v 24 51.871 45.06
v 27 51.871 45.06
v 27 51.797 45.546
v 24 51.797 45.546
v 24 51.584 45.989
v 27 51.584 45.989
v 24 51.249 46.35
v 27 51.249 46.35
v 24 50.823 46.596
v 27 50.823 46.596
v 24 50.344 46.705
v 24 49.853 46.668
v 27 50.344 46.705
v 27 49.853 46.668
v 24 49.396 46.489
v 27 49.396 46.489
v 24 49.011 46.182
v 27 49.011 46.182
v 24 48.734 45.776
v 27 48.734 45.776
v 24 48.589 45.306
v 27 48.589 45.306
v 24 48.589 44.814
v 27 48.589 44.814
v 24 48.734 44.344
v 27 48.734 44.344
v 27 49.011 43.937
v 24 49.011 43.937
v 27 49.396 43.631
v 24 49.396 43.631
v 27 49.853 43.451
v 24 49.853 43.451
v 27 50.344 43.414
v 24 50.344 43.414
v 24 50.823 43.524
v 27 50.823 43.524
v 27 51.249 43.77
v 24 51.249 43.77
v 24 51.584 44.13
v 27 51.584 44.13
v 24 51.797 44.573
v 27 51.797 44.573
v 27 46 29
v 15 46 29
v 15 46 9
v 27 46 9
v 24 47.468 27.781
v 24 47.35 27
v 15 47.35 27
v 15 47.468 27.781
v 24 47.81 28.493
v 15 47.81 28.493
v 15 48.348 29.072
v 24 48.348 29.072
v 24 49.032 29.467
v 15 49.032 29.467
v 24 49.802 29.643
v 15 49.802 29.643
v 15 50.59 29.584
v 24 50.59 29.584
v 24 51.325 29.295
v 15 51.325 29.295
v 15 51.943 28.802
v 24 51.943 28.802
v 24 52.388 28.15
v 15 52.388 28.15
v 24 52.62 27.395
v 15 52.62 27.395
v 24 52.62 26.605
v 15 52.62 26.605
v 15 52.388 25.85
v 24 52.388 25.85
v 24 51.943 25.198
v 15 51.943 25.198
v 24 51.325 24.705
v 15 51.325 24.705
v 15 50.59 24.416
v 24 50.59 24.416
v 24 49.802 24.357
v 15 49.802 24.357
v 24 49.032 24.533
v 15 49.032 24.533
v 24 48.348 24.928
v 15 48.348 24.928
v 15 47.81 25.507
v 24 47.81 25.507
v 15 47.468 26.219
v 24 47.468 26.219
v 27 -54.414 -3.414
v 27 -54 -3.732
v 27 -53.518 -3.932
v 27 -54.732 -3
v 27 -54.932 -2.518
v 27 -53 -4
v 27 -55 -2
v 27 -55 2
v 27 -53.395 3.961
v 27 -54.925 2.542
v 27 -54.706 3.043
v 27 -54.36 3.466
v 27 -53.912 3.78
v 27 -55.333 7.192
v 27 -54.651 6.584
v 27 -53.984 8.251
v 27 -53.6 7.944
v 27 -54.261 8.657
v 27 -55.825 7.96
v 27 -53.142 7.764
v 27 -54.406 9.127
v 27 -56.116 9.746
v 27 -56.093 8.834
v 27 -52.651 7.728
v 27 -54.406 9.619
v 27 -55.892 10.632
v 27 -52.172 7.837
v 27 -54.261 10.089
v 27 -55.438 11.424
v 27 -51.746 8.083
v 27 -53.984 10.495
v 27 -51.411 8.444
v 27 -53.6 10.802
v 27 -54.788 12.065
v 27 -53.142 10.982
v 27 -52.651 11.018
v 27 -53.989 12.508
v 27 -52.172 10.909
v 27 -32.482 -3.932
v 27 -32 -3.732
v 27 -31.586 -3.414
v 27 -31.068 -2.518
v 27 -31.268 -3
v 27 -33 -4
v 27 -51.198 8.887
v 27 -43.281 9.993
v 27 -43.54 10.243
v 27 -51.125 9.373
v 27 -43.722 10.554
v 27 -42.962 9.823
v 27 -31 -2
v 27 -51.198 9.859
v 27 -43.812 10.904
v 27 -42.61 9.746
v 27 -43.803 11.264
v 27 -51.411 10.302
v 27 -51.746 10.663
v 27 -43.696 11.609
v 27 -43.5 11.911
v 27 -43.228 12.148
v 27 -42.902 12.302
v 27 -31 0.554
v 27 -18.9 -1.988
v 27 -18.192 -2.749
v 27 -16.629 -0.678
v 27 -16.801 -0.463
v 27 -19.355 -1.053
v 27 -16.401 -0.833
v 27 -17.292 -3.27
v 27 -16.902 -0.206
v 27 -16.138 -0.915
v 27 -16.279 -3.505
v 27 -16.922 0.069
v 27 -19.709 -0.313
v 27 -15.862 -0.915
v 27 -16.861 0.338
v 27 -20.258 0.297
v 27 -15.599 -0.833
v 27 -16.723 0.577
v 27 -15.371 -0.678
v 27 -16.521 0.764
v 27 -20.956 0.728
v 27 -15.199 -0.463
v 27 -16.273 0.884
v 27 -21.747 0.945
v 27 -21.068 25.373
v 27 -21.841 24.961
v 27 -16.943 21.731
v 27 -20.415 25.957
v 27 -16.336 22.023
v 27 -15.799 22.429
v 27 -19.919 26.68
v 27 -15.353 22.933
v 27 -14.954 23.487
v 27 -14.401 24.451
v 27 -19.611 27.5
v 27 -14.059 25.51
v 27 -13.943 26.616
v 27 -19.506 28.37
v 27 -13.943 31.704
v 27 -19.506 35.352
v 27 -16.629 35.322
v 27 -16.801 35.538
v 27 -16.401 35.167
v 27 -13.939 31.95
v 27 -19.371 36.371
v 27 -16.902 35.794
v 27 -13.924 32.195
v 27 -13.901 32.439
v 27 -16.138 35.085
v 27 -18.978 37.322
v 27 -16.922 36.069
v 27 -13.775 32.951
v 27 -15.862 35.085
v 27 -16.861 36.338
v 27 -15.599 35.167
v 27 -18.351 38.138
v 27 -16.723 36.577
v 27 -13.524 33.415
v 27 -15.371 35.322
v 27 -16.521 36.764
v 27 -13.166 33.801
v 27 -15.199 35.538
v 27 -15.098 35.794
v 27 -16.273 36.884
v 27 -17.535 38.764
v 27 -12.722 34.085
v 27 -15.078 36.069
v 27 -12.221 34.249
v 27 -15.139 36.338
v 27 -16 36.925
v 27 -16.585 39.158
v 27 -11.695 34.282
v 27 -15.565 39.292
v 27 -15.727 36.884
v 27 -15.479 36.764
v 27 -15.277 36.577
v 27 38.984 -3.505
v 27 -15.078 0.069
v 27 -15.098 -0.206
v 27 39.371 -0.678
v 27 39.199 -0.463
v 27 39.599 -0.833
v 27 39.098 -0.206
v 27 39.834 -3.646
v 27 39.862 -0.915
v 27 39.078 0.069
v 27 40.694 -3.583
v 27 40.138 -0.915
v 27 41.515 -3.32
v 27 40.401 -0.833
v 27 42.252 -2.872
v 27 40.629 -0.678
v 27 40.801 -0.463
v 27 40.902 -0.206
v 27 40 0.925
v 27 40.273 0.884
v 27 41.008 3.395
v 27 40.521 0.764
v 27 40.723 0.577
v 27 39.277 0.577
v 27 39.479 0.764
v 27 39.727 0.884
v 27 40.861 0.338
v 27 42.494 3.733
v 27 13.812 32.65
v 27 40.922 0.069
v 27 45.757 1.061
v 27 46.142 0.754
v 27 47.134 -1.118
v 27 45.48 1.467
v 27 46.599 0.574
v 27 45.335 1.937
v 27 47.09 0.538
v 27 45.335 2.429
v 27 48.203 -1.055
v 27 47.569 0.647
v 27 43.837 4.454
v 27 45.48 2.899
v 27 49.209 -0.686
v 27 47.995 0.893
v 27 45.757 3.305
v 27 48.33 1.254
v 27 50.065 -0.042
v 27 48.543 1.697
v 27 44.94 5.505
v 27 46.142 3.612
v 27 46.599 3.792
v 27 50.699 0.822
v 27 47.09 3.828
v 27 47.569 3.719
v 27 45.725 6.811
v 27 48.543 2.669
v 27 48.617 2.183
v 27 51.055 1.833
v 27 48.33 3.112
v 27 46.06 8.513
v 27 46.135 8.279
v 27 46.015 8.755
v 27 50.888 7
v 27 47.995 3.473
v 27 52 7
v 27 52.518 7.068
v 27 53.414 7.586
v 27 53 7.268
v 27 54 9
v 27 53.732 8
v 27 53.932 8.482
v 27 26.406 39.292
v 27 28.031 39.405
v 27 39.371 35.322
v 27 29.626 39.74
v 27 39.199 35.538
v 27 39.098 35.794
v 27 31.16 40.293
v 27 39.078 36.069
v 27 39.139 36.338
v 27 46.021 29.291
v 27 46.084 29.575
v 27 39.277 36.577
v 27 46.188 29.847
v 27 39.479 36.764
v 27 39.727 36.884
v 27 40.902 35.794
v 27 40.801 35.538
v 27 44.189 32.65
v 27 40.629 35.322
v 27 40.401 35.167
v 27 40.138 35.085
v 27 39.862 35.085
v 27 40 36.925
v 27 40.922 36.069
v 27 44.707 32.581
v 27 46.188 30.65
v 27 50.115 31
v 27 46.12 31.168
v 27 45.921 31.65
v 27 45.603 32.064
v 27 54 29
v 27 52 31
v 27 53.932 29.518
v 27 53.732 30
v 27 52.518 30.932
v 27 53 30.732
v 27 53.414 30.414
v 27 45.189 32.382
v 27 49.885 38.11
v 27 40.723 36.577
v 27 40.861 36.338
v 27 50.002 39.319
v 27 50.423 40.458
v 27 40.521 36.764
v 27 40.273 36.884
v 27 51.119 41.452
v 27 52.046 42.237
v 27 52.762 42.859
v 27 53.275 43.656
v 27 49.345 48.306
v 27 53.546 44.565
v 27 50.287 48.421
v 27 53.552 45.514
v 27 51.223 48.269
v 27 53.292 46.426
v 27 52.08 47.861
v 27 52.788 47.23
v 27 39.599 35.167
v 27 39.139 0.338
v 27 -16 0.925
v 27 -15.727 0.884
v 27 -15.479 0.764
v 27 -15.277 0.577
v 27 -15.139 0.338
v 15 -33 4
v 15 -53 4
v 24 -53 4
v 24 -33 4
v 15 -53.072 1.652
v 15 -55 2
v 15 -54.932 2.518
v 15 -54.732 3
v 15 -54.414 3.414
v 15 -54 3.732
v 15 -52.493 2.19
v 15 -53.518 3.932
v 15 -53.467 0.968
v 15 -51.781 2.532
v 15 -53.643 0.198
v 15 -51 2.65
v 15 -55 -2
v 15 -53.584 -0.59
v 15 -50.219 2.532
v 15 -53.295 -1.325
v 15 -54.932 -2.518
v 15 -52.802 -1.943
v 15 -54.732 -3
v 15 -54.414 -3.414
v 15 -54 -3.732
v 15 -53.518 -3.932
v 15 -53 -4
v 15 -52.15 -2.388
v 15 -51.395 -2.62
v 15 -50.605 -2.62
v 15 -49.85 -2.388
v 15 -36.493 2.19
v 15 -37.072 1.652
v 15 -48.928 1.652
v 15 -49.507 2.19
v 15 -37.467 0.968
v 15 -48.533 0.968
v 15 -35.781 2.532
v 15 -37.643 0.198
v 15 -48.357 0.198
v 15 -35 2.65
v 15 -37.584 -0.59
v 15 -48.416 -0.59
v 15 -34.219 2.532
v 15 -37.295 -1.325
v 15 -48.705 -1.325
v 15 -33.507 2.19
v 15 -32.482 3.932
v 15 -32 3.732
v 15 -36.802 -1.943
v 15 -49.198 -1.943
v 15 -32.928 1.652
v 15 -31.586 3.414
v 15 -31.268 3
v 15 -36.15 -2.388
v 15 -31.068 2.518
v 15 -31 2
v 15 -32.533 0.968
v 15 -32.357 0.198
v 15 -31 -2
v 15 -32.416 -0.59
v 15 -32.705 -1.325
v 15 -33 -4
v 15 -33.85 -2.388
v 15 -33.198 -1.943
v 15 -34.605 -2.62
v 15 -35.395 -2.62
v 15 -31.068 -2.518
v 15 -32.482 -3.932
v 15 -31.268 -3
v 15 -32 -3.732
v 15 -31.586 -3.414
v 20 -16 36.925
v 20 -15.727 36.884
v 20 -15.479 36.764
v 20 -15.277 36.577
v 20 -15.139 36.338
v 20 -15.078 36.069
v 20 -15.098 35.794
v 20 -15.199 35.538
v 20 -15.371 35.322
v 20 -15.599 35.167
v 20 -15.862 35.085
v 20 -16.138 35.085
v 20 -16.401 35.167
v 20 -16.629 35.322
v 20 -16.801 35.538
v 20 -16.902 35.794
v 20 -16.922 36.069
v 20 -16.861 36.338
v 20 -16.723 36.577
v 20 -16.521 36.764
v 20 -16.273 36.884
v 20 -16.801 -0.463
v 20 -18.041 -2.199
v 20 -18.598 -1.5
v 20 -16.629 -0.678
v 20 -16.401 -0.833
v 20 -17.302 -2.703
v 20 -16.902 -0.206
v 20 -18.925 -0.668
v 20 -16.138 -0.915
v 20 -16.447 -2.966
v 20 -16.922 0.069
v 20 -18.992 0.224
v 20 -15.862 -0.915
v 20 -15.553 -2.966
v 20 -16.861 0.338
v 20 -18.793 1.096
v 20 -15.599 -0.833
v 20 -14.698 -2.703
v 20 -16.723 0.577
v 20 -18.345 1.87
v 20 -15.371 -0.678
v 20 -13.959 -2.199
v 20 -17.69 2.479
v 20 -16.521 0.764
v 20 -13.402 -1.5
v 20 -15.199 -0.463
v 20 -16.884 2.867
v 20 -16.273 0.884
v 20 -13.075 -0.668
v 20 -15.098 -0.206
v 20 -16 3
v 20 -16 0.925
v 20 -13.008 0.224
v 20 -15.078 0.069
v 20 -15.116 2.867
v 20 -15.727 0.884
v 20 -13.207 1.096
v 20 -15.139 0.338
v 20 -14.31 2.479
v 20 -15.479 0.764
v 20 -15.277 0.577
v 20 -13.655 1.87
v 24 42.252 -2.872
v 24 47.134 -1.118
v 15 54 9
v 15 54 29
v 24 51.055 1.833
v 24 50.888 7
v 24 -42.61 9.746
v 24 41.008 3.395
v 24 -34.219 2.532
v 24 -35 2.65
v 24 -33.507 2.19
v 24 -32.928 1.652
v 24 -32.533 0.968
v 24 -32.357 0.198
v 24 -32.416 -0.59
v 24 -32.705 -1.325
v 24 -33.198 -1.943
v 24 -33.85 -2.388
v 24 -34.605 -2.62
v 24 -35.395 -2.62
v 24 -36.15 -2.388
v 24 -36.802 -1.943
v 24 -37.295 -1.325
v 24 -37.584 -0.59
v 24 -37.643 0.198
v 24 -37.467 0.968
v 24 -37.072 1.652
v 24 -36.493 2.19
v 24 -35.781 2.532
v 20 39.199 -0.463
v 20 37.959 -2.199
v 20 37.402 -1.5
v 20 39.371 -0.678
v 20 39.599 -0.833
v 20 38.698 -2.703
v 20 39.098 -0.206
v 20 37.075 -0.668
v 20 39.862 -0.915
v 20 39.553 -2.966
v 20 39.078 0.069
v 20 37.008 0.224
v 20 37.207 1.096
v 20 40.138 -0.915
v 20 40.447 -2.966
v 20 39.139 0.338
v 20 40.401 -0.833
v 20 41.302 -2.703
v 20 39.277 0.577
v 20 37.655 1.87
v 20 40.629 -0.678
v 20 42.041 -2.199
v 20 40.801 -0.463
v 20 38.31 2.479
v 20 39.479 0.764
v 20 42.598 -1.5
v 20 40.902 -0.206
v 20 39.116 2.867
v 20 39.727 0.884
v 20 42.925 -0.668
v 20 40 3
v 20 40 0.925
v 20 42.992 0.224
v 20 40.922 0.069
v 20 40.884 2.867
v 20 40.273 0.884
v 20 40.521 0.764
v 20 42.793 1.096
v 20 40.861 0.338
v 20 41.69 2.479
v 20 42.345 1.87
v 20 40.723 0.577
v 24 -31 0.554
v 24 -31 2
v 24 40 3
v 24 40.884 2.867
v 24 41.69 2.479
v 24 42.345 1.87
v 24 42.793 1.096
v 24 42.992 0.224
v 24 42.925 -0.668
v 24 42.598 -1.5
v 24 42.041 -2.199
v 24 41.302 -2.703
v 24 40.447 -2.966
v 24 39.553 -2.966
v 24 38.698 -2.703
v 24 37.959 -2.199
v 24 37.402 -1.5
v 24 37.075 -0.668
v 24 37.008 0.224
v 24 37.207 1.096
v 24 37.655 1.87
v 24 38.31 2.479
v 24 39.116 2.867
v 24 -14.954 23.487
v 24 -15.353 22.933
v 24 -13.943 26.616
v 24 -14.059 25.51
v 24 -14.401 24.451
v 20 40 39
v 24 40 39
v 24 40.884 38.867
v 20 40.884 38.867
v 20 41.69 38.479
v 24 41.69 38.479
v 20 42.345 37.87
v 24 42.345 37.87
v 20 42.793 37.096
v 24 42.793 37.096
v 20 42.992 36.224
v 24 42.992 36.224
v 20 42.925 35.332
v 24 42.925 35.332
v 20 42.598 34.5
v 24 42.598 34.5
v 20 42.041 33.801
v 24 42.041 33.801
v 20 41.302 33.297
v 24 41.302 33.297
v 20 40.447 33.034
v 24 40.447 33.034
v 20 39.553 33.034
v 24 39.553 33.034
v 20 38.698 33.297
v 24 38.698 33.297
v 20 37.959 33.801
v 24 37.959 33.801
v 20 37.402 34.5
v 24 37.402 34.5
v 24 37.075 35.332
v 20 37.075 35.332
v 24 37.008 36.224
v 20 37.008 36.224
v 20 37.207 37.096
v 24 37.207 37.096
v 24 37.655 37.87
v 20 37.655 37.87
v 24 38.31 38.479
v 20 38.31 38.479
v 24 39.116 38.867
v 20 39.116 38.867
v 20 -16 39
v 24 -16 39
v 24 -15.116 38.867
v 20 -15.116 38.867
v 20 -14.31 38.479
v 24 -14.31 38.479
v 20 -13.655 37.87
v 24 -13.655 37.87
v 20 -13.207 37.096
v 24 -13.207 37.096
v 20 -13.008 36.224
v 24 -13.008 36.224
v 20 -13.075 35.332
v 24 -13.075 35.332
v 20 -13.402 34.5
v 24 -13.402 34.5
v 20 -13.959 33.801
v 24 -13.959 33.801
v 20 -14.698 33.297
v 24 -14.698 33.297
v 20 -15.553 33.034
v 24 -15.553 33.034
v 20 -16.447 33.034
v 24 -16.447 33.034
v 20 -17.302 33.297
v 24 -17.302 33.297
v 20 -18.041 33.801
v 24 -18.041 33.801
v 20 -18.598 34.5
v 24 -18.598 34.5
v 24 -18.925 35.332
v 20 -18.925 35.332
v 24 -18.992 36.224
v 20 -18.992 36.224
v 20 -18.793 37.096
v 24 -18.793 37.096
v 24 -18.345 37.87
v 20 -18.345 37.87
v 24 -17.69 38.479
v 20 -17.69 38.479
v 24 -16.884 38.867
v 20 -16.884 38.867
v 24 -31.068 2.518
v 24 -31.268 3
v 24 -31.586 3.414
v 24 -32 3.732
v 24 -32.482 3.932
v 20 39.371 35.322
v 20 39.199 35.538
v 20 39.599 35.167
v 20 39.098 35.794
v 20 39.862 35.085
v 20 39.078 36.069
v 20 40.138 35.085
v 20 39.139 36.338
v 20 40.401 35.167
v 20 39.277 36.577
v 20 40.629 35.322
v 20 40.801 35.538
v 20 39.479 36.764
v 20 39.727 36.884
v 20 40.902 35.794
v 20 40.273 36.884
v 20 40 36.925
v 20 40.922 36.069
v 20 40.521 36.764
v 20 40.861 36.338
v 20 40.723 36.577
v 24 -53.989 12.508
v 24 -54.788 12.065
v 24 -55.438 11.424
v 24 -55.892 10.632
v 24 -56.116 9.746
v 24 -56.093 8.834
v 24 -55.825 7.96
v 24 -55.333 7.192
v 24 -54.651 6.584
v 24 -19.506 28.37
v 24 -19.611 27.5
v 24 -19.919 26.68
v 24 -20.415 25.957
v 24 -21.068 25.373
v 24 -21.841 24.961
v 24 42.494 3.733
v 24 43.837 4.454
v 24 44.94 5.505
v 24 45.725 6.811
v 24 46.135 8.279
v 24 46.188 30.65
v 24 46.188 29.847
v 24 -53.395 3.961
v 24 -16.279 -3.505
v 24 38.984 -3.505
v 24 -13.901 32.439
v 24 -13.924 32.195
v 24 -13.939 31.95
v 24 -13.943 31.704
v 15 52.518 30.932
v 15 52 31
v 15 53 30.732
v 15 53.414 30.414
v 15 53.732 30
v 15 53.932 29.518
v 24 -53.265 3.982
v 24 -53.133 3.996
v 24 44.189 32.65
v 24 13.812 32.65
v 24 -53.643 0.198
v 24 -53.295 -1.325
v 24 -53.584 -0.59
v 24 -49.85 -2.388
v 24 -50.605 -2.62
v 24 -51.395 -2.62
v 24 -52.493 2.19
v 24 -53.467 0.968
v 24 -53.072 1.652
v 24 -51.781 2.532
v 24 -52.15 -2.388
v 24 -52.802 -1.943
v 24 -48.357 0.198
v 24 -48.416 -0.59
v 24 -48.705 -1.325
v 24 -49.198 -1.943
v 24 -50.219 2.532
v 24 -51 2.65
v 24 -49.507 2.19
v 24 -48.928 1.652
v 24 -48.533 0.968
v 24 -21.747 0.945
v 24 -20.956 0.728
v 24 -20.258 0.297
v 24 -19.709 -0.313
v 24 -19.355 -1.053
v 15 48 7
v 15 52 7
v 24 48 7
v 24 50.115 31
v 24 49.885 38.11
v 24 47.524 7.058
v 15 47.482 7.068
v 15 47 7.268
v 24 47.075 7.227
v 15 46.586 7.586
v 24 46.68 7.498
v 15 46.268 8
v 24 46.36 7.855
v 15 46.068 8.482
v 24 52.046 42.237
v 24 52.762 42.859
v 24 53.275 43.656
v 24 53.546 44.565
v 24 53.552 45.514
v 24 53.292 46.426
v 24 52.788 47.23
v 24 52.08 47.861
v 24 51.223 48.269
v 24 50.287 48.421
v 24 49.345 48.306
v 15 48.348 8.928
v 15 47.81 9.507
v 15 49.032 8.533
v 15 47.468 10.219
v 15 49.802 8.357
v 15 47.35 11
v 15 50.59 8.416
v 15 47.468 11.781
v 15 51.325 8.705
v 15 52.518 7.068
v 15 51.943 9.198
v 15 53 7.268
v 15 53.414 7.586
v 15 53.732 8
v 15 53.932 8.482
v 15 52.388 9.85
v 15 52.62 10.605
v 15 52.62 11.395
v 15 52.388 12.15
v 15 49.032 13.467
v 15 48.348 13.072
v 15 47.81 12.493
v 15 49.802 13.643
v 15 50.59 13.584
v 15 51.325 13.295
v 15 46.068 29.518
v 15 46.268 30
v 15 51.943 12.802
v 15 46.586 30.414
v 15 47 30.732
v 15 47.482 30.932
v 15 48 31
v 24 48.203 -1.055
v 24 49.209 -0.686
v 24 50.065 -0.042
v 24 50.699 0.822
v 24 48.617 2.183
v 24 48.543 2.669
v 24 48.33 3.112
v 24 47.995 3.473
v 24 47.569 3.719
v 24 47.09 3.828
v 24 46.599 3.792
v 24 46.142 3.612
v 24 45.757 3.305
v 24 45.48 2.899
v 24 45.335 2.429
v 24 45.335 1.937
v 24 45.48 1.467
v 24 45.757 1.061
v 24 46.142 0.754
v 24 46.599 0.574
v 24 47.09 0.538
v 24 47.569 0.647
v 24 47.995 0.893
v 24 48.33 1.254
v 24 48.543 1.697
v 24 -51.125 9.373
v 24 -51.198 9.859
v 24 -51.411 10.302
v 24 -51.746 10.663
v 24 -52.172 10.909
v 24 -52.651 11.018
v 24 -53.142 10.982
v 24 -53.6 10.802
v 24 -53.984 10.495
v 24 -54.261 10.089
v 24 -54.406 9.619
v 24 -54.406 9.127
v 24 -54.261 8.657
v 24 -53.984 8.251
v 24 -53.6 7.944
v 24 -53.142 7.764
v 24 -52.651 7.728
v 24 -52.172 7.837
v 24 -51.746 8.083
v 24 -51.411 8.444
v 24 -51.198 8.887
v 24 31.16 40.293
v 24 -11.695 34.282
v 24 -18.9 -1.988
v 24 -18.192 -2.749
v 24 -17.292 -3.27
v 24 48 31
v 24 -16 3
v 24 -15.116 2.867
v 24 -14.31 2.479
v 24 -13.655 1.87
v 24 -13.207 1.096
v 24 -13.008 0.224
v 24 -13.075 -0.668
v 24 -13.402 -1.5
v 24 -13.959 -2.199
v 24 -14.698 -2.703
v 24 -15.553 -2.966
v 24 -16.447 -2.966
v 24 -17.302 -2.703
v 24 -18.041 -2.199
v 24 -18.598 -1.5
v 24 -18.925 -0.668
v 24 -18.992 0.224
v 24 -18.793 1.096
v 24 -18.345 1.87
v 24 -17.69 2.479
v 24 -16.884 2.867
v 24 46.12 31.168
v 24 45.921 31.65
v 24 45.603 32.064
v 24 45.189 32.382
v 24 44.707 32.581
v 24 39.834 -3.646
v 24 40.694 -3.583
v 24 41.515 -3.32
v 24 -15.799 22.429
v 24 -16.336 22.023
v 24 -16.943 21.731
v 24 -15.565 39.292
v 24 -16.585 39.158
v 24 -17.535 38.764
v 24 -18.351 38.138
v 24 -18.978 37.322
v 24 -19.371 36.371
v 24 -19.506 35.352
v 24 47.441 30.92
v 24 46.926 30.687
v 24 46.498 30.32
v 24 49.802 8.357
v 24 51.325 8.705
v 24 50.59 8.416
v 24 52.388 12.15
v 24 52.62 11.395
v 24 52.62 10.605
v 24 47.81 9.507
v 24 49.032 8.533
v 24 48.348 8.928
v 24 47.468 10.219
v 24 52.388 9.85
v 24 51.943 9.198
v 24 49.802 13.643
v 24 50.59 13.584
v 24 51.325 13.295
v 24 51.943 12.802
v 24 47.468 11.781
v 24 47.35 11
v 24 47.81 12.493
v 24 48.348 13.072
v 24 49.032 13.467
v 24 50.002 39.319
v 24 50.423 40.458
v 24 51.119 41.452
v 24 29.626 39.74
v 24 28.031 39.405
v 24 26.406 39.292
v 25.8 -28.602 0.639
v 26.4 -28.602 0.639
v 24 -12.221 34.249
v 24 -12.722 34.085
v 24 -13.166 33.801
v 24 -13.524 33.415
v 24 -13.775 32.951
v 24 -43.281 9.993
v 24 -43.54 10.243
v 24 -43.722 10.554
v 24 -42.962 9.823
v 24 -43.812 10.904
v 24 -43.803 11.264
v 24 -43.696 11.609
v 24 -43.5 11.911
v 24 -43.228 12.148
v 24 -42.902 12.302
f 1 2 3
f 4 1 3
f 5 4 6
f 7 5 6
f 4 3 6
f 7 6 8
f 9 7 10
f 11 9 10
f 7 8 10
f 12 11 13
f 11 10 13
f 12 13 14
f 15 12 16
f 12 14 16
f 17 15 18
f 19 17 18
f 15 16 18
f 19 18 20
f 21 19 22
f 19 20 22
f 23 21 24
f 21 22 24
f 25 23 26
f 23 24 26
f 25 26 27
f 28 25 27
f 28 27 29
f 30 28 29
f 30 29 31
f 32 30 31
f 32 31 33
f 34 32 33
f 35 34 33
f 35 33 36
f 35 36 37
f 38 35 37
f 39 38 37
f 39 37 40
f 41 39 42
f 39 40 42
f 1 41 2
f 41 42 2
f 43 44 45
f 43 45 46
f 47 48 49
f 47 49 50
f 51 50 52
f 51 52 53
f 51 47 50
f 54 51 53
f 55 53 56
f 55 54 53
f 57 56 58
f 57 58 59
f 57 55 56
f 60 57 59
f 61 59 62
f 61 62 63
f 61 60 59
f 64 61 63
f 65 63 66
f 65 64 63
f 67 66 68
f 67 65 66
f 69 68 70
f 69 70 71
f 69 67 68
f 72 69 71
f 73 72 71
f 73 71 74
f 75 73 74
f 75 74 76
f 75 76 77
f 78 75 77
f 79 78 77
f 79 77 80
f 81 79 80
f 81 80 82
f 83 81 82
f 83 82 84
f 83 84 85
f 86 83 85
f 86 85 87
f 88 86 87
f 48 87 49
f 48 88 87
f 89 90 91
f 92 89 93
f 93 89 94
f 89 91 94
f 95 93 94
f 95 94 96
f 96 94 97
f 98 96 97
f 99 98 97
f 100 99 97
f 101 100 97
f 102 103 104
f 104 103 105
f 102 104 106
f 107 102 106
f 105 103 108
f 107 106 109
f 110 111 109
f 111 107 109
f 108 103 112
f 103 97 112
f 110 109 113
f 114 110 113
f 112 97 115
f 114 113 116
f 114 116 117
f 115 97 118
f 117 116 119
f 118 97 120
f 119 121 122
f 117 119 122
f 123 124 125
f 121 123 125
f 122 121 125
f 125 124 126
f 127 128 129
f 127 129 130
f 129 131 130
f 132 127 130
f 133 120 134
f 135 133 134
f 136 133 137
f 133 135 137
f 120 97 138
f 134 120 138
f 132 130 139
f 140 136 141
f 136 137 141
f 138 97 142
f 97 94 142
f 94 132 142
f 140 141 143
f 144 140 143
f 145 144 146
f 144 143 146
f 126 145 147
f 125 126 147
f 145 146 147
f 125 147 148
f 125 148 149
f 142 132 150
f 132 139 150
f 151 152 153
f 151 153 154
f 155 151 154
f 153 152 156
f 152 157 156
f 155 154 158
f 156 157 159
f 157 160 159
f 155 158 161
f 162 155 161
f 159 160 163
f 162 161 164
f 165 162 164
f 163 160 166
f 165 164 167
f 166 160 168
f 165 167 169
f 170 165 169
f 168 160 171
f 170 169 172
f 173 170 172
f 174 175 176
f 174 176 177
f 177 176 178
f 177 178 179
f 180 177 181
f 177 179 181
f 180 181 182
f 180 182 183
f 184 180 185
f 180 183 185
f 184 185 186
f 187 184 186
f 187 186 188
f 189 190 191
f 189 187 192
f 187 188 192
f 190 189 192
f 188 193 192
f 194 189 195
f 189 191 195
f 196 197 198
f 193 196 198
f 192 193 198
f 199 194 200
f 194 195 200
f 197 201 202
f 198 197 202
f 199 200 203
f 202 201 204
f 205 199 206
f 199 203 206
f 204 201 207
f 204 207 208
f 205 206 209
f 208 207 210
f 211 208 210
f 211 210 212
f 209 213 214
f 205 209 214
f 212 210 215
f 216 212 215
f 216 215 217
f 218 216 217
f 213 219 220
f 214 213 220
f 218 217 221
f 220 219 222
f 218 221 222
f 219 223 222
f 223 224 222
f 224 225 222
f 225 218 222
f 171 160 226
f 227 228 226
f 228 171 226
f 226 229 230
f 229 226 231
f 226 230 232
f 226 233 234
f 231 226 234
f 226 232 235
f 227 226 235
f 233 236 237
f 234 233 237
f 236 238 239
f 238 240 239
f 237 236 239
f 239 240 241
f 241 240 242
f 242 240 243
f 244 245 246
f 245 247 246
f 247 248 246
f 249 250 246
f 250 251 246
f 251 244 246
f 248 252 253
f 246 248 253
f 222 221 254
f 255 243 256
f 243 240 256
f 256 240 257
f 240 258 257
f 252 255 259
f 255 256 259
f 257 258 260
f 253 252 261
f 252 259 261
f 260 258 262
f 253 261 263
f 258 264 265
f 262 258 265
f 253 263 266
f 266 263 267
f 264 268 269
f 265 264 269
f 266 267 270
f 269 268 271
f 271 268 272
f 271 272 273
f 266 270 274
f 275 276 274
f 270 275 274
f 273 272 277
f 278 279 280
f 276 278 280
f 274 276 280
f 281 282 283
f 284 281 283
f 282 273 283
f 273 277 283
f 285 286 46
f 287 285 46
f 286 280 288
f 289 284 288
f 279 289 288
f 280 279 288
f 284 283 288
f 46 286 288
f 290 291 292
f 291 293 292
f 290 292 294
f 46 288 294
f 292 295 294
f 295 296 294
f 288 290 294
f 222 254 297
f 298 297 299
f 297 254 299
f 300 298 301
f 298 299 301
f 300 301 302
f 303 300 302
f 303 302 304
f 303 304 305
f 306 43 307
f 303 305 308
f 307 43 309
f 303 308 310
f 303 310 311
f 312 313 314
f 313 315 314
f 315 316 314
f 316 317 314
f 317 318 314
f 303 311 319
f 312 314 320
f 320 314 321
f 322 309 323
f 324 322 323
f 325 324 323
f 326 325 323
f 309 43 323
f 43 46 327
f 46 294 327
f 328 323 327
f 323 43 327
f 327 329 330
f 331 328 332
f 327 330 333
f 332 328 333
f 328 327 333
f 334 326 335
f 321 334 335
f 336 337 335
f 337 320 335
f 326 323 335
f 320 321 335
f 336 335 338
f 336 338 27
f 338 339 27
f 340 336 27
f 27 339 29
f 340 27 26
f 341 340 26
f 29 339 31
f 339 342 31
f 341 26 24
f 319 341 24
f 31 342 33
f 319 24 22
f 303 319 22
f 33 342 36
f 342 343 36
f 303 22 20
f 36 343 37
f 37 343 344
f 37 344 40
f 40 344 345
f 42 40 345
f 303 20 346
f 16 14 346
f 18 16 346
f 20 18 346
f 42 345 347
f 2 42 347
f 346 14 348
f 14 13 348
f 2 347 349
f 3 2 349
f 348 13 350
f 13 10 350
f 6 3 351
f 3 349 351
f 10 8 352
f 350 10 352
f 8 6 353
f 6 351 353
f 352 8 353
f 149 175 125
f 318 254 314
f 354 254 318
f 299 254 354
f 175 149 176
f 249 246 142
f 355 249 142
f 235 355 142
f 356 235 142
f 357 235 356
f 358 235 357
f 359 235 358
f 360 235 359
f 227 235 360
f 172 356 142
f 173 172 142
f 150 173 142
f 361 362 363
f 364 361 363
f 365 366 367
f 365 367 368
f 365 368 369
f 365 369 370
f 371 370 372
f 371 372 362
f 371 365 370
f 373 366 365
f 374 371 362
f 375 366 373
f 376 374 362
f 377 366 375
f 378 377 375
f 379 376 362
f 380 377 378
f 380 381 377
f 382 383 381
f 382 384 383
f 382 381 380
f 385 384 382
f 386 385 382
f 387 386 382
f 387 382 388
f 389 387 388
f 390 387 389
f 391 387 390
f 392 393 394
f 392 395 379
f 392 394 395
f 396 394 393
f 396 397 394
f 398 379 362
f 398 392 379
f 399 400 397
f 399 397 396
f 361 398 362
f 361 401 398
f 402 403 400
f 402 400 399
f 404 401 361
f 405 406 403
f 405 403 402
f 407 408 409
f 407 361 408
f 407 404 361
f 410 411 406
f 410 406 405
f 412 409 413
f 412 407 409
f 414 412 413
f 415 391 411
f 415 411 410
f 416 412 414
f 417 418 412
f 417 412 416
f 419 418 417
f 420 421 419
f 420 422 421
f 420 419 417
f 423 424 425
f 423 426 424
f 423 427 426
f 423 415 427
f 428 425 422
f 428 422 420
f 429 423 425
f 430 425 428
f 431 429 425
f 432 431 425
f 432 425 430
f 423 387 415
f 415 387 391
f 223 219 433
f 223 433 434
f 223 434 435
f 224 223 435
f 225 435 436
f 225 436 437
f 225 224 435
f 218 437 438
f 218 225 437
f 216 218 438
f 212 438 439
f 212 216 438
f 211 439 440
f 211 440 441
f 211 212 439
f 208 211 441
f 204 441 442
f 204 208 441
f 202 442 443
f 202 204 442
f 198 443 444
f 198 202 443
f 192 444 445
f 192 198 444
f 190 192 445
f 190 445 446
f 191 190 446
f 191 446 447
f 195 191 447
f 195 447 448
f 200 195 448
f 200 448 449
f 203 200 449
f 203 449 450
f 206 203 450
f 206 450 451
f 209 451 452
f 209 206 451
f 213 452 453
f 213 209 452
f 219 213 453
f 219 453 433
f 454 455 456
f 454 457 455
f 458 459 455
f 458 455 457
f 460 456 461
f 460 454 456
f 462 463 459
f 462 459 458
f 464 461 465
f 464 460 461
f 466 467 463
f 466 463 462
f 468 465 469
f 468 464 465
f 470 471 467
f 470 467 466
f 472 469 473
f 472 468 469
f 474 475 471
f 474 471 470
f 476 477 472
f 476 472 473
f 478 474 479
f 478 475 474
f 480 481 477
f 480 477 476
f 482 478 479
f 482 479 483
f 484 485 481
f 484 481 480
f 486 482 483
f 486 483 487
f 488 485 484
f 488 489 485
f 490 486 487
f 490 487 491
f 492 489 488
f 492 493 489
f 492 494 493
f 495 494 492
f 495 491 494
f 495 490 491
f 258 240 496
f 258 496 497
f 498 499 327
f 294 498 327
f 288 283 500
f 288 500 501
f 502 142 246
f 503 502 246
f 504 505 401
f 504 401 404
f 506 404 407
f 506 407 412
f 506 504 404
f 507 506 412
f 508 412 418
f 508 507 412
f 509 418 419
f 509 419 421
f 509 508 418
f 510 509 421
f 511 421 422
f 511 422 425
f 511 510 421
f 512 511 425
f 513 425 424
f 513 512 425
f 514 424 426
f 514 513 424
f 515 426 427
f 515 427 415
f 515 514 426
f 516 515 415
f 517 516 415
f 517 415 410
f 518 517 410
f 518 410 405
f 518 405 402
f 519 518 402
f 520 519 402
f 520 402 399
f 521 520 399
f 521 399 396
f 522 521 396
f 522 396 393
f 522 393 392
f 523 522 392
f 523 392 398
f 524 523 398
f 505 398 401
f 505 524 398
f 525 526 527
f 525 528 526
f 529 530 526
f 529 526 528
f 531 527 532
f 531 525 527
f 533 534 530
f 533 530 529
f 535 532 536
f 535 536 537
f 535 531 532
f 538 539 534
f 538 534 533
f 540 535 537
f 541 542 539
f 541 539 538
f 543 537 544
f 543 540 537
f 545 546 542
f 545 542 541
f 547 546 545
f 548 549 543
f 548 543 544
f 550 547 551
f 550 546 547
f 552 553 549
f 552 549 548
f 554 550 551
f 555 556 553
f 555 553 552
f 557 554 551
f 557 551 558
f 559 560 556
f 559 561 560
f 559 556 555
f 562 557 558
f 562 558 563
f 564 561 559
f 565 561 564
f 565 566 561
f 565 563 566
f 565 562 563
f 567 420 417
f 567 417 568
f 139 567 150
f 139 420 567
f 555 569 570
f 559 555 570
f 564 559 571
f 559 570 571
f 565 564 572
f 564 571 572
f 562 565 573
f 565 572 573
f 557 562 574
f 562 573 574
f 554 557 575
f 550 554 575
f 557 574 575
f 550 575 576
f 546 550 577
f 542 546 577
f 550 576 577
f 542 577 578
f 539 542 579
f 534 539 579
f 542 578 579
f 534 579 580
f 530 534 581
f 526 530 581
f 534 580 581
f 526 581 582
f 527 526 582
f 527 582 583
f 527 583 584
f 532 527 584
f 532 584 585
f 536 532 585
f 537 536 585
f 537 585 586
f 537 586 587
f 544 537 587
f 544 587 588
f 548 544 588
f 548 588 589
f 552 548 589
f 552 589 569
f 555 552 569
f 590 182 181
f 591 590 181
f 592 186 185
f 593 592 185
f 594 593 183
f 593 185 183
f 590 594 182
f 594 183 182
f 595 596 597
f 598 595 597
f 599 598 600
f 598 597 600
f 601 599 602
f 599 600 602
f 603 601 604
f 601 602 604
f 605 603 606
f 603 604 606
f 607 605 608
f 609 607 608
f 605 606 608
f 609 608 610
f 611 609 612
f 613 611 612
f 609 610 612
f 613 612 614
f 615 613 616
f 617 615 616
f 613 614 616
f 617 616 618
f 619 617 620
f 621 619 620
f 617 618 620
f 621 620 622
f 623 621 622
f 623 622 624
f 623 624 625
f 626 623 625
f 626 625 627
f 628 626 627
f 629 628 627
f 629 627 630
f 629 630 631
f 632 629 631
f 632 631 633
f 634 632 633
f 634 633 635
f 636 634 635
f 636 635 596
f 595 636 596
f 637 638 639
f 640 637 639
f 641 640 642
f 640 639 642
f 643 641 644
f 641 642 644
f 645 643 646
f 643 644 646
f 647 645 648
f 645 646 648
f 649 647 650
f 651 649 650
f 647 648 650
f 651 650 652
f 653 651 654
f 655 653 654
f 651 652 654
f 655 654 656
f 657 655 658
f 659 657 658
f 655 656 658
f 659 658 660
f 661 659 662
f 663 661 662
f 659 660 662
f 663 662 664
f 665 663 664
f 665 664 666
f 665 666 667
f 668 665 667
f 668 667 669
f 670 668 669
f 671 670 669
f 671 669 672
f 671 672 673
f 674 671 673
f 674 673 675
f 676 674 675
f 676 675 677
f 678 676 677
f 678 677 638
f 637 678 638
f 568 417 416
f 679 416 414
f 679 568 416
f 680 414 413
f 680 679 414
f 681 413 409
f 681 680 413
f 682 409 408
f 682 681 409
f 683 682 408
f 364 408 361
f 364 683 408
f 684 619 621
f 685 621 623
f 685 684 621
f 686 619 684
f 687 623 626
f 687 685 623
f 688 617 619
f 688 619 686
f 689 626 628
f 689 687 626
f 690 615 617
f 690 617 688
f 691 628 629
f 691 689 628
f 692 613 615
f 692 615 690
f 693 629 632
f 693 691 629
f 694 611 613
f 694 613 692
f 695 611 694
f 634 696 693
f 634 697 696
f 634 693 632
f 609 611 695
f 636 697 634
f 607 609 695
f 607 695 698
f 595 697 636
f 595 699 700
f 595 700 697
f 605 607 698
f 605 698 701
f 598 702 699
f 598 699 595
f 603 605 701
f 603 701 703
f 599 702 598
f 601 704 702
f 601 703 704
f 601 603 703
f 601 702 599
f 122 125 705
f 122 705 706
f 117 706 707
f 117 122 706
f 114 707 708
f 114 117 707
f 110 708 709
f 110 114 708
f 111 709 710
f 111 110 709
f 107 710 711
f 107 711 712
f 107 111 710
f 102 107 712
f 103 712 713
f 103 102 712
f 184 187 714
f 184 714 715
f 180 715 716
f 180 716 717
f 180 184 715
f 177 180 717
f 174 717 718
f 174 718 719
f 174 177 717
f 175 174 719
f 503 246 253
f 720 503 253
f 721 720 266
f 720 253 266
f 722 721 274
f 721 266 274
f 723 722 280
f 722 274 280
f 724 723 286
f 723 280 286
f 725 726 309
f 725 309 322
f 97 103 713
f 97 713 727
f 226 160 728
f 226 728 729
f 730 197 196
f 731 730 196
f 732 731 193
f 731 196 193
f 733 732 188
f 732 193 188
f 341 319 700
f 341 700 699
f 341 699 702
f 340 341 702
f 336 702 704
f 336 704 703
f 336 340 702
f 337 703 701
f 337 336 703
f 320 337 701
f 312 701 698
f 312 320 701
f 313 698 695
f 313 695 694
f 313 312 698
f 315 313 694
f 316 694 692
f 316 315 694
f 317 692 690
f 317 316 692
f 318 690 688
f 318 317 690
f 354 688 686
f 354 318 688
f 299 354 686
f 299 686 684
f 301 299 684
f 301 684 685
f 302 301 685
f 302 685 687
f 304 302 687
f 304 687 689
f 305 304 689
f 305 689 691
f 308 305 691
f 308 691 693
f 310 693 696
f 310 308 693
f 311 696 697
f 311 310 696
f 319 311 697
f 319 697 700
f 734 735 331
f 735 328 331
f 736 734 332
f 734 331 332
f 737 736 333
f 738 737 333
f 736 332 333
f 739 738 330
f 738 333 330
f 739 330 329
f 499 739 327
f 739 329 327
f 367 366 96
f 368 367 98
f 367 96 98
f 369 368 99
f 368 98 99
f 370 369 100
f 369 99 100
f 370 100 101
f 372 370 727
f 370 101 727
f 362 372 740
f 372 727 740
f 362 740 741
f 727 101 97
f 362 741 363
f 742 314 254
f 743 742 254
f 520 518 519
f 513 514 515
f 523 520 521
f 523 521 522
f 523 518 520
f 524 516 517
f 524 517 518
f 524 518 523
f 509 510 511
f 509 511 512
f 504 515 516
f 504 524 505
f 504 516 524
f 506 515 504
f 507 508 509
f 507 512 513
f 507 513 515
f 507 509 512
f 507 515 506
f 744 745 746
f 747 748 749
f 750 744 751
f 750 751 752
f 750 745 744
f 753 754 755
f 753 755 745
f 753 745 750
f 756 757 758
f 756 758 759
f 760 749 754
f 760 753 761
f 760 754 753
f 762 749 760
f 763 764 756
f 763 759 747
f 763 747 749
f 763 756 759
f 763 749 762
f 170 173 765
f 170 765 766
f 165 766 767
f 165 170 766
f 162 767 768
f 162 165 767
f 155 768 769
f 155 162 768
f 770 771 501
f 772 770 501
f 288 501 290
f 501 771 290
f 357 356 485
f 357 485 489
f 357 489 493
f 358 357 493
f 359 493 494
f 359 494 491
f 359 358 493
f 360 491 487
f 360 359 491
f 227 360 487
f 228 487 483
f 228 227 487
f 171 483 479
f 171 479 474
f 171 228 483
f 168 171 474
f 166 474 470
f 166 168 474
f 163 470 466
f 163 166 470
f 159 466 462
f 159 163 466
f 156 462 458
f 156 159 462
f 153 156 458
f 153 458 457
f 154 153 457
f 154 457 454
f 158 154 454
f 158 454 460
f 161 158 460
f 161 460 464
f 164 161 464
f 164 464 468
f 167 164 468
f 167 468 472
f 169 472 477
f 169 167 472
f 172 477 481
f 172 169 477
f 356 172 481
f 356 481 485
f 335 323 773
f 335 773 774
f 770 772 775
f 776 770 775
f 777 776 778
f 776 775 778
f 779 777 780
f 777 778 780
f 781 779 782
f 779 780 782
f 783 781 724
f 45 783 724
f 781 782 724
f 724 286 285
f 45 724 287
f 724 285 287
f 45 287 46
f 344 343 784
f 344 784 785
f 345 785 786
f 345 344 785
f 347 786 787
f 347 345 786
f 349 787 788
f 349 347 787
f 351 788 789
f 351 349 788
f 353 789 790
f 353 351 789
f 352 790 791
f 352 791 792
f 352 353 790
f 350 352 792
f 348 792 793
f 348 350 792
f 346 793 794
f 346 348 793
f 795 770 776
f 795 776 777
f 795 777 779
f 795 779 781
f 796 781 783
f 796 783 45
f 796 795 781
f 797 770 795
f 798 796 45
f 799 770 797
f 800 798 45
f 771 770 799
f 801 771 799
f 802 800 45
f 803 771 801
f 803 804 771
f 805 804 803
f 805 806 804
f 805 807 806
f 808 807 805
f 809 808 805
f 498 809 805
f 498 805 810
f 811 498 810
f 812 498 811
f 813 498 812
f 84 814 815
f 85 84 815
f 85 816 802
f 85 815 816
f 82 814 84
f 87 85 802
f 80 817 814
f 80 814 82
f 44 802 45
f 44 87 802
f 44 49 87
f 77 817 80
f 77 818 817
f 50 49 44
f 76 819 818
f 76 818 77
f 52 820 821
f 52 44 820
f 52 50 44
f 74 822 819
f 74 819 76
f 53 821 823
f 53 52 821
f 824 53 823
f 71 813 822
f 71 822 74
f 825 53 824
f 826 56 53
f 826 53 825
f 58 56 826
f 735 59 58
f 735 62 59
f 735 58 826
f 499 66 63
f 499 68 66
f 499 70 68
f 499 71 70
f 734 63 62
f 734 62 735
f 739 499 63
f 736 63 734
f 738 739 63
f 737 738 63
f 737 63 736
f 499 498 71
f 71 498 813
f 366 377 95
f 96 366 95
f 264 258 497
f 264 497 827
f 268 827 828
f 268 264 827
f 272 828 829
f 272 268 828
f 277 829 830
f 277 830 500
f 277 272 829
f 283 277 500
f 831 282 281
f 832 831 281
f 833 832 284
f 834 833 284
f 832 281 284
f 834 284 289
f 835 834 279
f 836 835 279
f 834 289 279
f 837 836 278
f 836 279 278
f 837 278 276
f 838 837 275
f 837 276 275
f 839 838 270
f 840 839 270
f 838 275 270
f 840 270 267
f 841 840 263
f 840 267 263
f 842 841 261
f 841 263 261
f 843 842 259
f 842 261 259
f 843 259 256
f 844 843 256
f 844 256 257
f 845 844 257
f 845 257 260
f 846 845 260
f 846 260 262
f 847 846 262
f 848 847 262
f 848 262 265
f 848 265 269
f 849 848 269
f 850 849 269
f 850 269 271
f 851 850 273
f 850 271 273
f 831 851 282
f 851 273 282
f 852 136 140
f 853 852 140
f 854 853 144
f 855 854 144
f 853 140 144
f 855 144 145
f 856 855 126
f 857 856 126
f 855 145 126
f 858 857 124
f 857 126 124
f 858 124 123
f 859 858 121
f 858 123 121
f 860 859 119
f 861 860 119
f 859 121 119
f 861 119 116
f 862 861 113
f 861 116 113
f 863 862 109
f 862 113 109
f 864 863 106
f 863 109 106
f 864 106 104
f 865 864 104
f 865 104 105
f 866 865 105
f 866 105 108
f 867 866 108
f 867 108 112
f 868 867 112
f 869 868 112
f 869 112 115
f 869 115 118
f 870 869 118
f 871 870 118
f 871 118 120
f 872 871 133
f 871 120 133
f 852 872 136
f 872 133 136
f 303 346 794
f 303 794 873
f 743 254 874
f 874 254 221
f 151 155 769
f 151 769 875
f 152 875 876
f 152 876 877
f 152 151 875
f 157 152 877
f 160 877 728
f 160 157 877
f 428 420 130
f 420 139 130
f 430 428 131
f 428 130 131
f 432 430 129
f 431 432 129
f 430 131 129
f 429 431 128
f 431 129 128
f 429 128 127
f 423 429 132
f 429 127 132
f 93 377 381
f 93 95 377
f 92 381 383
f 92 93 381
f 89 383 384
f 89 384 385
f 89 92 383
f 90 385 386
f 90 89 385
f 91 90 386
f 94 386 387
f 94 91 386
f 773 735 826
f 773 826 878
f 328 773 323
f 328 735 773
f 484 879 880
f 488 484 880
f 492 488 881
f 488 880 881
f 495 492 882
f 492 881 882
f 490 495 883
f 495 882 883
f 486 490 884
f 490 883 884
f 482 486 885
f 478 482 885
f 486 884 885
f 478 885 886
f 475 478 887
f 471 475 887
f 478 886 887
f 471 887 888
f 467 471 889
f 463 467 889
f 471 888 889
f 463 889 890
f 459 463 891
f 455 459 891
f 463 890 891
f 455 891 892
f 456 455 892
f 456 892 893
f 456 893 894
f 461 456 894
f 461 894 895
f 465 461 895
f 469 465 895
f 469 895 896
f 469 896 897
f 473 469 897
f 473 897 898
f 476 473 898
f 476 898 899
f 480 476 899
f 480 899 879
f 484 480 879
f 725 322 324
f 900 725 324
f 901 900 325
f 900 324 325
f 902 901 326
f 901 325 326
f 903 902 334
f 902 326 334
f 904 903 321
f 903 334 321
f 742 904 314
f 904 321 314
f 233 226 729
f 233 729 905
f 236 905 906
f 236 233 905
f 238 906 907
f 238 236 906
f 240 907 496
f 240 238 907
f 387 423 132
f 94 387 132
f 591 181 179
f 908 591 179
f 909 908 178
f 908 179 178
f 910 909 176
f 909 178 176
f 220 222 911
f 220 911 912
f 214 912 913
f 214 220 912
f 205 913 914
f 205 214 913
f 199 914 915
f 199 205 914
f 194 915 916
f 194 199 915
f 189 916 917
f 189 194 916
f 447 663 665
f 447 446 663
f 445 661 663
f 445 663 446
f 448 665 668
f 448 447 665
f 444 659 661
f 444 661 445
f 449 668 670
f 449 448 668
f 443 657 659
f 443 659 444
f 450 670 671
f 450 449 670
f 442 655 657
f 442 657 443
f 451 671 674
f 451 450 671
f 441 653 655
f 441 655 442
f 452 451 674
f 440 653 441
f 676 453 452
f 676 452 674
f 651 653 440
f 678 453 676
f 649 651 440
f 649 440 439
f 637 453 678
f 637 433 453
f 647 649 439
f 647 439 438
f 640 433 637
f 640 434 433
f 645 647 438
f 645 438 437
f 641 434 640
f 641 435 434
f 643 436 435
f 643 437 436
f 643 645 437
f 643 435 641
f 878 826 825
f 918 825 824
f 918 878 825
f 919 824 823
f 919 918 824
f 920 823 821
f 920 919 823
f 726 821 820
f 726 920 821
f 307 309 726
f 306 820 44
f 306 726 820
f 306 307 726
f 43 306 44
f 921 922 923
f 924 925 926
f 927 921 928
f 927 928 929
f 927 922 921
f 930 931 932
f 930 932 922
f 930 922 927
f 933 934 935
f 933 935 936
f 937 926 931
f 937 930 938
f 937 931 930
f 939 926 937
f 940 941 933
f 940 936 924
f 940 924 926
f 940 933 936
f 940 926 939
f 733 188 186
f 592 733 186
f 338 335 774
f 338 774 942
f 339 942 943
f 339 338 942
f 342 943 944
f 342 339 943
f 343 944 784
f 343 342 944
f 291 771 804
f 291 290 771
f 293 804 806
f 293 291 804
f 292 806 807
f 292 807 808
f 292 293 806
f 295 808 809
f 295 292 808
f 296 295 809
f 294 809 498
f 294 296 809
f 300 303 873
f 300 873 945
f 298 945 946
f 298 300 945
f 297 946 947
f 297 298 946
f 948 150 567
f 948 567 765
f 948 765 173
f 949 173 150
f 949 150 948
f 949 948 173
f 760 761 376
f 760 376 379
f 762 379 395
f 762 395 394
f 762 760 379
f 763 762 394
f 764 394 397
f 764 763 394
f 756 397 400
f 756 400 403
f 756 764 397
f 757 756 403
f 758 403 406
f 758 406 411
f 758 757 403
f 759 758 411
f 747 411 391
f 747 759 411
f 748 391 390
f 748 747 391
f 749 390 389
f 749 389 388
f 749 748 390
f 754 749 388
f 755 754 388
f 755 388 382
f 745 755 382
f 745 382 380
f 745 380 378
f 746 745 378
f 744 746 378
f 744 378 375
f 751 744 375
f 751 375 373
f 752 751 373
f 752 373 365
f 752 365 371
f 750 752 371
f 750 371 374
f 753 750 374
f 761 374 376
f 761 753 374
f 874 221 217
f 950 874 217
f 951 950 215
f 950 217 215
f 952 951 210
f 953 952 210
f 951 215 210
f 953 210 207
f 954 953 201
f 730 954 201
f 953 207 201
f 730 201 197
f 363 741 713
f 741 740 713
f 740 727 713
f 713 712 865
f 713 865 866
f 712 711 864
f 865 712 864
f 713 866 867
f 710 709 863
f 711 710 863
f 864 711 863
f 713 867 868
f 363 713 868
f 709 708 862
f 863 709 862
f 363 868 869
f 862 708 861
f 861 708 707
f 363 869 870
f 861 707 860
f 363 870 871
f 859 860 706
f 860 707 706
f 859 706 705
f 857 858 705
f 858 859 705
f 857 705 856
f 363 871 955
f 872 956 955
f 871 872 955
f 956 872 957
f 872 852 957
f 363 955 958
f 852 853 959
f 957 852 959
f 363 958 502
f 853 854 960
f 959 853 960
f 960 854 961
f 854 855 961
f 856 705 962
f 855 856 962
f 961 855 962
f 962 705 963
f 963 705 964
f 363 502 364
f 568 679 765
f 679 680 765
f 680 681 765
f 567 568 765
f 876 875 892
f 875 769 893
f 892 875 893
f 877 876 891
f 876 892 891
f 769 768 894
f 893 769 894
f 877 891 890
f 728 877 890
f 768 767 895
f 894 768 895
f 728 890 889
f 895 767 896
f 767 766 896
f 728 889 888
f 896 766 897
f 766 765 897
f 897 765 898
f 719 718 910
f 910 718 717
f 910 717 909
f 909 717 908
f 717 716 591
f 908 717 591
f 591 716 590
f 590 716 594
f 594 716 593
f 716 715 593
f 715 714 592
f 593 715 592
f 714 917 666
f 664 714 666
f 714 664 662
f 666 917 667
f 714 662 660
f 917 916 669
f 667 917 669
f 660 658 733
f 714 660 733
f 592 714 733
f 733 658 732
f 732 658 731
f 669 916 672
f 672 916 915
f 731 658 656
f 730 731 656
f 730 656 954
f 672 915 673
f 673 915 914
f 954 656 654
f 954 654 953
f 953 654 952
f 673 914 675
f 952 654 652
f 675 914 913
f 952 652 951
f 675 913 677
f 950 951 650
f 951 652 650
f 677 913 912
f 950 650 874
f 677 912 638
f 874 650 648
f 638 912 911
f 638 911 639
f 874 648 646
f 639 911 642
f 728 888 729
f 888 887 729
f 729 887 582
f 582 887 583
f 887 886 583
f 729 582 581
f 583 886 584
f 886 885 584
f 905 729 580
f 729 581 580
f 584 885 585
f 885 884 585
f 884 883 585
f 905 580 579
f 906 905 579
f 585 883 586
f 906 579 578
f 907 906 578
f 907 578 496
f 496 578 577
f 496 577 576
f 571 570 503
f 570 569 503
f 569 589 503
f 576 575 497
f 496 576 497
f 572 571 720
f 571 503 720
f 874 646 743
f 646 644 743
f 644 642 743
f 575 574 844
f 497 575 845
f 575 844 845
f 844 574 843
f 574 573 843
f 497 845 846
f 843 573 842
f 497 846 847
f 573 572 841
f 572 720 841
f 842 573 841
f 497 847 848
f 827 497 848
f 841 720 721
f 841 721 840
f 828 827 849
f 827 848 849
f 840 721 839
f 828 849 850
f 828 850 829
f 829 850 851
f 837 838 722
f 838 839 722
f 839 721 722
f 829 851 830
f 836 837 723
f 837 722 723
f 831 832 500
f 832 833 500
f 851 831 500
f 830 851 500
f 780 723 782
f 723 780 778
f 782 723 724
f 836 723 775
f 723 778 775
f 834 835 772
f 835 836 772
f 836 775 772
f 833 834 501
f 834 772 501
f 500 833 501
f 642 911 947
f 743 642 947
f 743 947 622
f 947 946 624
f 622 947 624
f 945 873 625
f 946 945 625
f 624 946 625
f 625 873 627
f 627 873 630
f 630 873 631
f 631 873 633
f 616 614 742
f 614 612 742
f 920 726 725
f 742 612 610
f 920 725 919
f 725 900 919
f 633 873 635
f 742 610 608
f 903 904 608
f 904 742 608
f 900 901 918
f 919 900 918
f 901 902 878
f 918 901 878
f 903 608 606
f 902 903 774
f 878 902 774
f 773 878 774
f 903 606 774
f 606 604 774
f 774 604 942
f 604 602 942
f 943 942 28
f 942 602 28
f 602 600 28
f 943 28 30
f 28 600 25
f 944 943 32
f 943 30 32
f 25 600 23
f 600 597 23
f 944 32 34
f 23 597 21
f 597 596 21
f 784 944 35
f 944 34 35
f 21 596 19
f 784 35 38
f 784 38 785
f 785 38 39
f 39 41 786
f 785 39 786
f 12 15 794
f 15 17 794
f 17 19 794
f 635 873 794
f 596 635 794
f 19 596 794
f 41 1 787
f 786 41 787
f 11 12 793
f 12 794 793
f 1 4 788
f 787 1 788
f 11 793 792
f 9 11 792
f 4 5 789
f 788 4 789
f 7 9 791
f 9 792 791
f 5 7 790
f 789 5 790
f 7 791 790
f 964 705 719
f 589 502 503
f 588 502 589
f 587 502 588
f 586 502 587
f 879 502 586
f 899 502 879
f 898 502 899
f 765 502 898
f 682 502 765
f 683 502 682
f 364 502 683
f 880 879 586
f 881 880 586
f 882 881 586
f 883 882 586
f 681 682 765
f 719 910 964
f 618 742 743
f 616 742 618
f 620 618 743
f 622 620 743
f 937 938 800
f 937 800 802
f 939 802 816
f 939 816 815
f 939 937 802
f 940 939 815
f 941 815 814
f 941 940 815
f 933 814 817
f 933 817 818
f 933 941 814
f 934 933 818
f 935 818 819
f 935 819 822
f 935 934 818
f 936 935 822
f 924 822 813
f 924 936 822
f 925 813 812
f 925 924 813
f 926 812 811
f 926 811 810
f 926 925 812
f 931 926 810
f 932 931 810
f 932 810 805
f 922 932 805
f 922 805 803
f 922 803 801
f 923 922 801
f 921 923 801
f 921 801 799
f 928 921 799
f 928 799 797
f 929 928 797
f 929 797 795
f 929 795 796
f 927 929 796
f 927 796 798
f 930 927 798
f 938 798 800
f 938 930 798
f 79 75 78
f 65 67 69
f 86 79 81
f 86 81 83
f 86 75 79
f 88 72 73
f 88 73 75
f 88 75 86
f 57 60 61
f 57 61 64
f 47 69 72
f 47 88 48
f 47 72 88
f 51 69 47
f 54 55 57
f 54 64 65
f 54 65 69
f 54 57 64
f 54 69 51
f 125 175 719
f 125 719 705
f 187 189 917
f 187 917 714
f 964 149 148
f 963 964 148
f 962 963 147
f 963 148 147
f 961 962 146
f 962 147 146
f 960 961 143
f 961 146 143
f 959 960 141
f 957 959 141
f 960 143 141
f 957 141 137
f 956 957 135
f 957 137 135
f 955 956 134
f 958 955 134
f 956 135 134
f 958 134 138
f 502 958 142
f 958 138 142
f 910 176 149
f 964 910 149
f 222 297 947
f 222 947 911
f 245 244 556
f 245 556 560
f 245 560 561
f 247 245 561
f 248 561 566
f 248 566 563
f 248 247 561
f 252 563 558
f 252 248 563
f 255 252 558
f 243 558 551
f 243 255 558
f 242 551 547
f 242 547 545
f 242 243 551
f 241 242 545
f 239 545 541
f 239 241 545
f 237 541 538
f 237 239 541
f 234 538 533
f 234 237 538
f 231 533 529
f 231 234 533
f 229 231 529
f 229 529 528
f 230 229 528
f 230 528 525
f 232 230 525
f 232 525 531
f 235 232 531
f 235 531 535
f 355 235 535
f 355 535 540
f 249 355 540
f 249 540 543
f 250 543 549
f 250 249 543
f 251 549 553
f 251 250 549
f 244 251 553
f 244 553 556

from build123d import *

# Parameters (mm, degrees)
CYLINDER003_R            = 2.65
CYLINDER003_DEPTH        = 9
CLONE009_PLACEMENT_ANGLE = 90
BOX002_W                 = 12
BOX002_H                 = 24
BOX002_DEPTH             = 8
FILLET_R                 = 2
CYLINDER002_R            = 0.925
CYLINDER002_DEPTH        = 7
CYLINDER001_R            = 3
CYLINDER001_DEPTH        = 7
SKETCH002_R              = 1.65
EXTRUDE002_DEPTH         = 3
CLONE010_PLACEMENT_ANGLE = 90


with BuildPart() as insert001:
    # Cylinder003 → Cylinder003 (new body)
    with BuildSketch(Plane(origin=(24, -35, 3), x_dir=(0, 0, 1), z_dir=(-1, 0, 0))):
        Circle(CYLINDER003_R)
    extrude(amount=CYLINDER003_DEPTH)


with BuildPart() as insert002:
    # Clone006 base: copy of insert001
    add(insert001.part)


with BuildPart() as insert002_1:
    # Clone006 placement: moved
    add(insert002.part.moved(Location((0, -16, 0))))


with BuildPart() as tieinserts001:
    # Fusion002 base: copy of insert001
    add(insert001.part)

    # Fusion002: union insert002
    add(insert002_1.part)


with BuildPart() as tieinserts001_1:
    # Fusion002 placement: moved
    add(tieinserts001.part.moved(Location((0, 0, -3))))


with BuildPart() as insertsfusion003:
    # Clone009 base: copy of tieInserts001
    add(tieinserts001_1.part)


with BuildPart() as insertsfusion003_1:
    # Clone009 placement: moved
    add(insertsfusion003.part.moved(Location((0, 50, 62))).rotate(Axis((0, 50, 62), (1, 0, 0)), CLONE009_PLACEMENT_ANGLE))

    # Fusion003: union tieInserts001
    add(tieinserts001_1.part)


with BuildPart() as tiefillet001:
    # Box002 → Box002 (new body)
    with BuildSketch(Plane(origin=(15, -55, -1), x_dir=(1, 0, 0), z_dir=(0, 0, 1))):
        with Locations((6, 12)):
            Rectangle(BOX002_W, BOX002_H)
    extrude(amount=BOX002_DEPTH)

    # Fillet
    fillet_edges = [tiefillet001.edges().sort_by_distance(p)[0] for p in [
        (21, -55, -1),
        (21, -55, 7),
        (21, -31, -1),
        (21, -31, 7),
    ]]
    fillet(fillet_edges, radius=FILLET_R)


with BuildPart() as tiefillet001_1:
    # Fillet placement: moved
    add(tiefillet001.part.moved(Location((0, 0, -3))))


with BuildPart() as hole002:
    # Cylinder002 → Cylinder002 (new body)
    with BuildSketch(Plane(origin=(27, -16, 0), x_dir=(0, 0, 1), z_dir=(-1, 0, 0))):
        Circle(CYLINDER002_R)
    extrude(amount=CYLINDER002_DEPTH)


with BuildPart() as hole003:
    # Clone003 base: copy of hole002
    add(hole002.part)


with BuildPart() as hole003_1:
    # Clone003 placement: moved
    add(hole003.part.moved(Location((0, 0, 36))))


with BuildPart() as hole004:
    # Clone004 base: copy of hole003
    add(hole003_1.part)


with BuildPart() as hole004_1:
    # Clone004 placement: moved
    add(hole004.part.moved(Location((0, 56, -36))))


with BuildPart() as hole005:
    # Clone005 base: copy of hole004
    add(hole004_1.part)


with BuildPart() as hole005_1:
    # Clone005 placement: moved
    add(hole005.part.moved(Location((0, 0, 36))))


with BuildPart() as holesfusion001:
    # Fusion base: copy of hole002
    add(hole002.part)

    # Fusion: union hole003, hole004, hole005
    add(hole003_1.part)
    add(hole004_1.part)
    add(hole005_1.part)


with BuildPart() as attach001:
    # Cylinder001 → Cylinder001 (new body)
    with BuildSketch(Plane(origin=(27, 40, 0), x_dir=(0, 0, 1), z_dir=(-1, 0, 0))):
        Circle(CYLINDER001_R)
    extrude(amount=CYLINDER001_DEPTH)


with BuildPart() as attach002:
    # Clone base: copy of attach001
    add(attach001.part)


with BuildPart() as attach002_1:
    # Clone placement: moved
    add(attach002.part.moved(Location((0, 0, 36))))


with BuildPart() as attach003:
    # Clone001 base: copy of attach002
    add(attach002_1.part)


with BuildPart() as attach003_1:
    # Clone001 placement: moved
    add(attach003.part.moved(Location((0, -56, -36))))


with BuildPart() as attach004:
    # Clone002 base: copy of attach003
    add(attach003_1.part)


with BuildPart() as attach004_1:
    # Clone002 placement: moved
    add(attach004.part.moved(Location((0, 0, 36))))


with BuildPart() as fullbracket001:
    # Sketch002 (on Face5 of Extrude001) → Extrude002 (new body)
    with BuildSketch(Plane.YZ.offset(27)):
        with BuildLine():
            Line((-21.840834, 24.960582), (-53.988857, 12.50779))
            ThreePointArc((-53.988857, 12.50779), (-56.115528, 9.746452), (-54.651077, 6.583683))
            add(Edge.make_bspline(
                [(-54.651077, 6.583683), (-53.010517, 3.198744), (-52.696371, 2.249369), (-51.549184, 1.787077), (-52.006912, 2.204484), (-45.648689, -0.330521), (-21.747141, 0.945049), (-21.747141, 0.945049)],
                knots=[0, 0, 0, 0, 0.2, 0.4, 0.6, 0.8, 1, 1, 1, 1], degree=3))
            ThreePointArc((-21.747141, 0.945049), (-20.257929, 0.297113), (-19.355012, -1.052819))
            ThreePointArc((-19.355012, -1.052819), (-18.192035, -2.749458), (-16.278951, -3.505242))
            Line((-16.278951, -3.505242), (38.983907, -3.505242))
            ThreePointArc((38.983907, -3.505242), (40.694219, -3.582907), (42.251751, -2.872069))
            Line((42.251751, -2.872069), (47.13375, -1.117604))
            ThreePointArc((47.13375, -1.117604), (49.660876, -0.395307), (51.055069, 1.832764))
            Line((51.055069, 1.832764), (49.885408, 38.110058))
            ThreePointArc((49.885408, 38.110058), (50.422789, 40.457526), (52.04587, 42.236569))
            ThreePointArc((52.04587, 42.236569), (53.292041, 46.426402), (49.345321, 48.305506))
            Line((49.345321, 48.305506), (31.159741, 40.29296))
            ThreePointArc((31.159741, 40.29296), (28.834741, 39.544977), (26.405518, 39.292031))
            Line((26.405518, 39.292031), (-15.565081, 39.292031))
            ThreePointArc((-15.565081, 39.292031), (-18.351405, 38.137898), (-19.505538, 35.351575))
            Line((-19.505538, 35.351575), (-19.505538, 28.369553))
            ThreePointArc((-19.505538, 28.369553), (-20.14535, 26.303476), (-21.840834, 24.960582))
        make_face()
        with Locations((-52.774566, 9.372986)):
            Circle(SKETCH002_R, mode=Mode.SUBTRACT)
        with Locations((50.220626, 45.059686)):
            Circle(SKETCH002_R, mode=Mode.SUBTRACT)
        with Locations((46.966619, 2.182986)):
            Circle(SKETCH002_R, mode=Mode.SUBTRACT)
        with BuildLine():
            ThreePointArc((-42.901854, 12.302255), (-43.81194, 10.903698), (-42.6099, 9.746408))
            Line((-42.6099, 9.746408), (41.00829, 3.39546))
            ThreePointArc((41.00829, 3.39546), (44.698125, 5.221862), (46.188436, 9.059779))
            Line((46.188436, 9.059779), (46.188436, 30.650335))
            ThreePointArc((46.188436, 30.650335), (45.602859, 32.064042), (44.189151, 32.649619))
            Line((44.189151, 32.649619), (13.812123, 32.649619))
            Line((13.812123, 32.649619), (-11.694611, 34.281909))
            ThreePointArc((-11.694611, 34.281909), (-13.16559, 33.801037), (-13.900901, 32.439297))
            ThreePointArc((-13.900901, 32.439297), (-13.932701, 32.072334), (-13.943313, 31.704149))
            Line((-13.943313, 31.704149), (-13.943313, 26.615805))
            ThreePointArc((-13.943313, 26.615805), (-14.202233, 24.971619), (-14.953931, 23.48658))
            Line((-14.953931, 23.48658), (-15.353167, 22.932962))
            ThreePointArc((-15.353167, 22.932962), (-16.05756, 22.212579), (-16.942805, 21.731473))
            Line((-16.942805, 21.731473), (-42.901854, 12.302255))
        make_face(mode=Mode.SUBTRACT)
    extrude(amount=-EXTRUDE002_DEPTH)

    # Fusion001: union attach004, attach003, attach002, attach001
    add(attach004_1.part)
    add(attach003_1.part)
    add(attach002_1.part)
    add(attach001.part)

    # Cut001: cut holesFusion001
    add(holesfusion001.part, mode=Mode.SUBTRACT)


with BuildPart() as fullbracket002:
    # Clone010 base: copy of tieFillet001
    add(tiefillet001_1.part)


with BuildPart() as fullbracket002_1:
    # Clone010 placement: moved
    add(fullbracket002.part.moved(Location((0, 50, 62))).rotate(Axis((0, 50, 62), (1, 0, 0)), CLONE010_PLACEMENT_ANGLE))

    # Fusion004: union tieFillet001, fullbracket001
    add(tiefillet001_1.part)
    add(fullbracket001.part)

    # Cut002: cut insertsFusion003
    add(insertsfusion003_1.part, mode=Mode.SUBTRACT)


solid = fullbracket002_1.part
